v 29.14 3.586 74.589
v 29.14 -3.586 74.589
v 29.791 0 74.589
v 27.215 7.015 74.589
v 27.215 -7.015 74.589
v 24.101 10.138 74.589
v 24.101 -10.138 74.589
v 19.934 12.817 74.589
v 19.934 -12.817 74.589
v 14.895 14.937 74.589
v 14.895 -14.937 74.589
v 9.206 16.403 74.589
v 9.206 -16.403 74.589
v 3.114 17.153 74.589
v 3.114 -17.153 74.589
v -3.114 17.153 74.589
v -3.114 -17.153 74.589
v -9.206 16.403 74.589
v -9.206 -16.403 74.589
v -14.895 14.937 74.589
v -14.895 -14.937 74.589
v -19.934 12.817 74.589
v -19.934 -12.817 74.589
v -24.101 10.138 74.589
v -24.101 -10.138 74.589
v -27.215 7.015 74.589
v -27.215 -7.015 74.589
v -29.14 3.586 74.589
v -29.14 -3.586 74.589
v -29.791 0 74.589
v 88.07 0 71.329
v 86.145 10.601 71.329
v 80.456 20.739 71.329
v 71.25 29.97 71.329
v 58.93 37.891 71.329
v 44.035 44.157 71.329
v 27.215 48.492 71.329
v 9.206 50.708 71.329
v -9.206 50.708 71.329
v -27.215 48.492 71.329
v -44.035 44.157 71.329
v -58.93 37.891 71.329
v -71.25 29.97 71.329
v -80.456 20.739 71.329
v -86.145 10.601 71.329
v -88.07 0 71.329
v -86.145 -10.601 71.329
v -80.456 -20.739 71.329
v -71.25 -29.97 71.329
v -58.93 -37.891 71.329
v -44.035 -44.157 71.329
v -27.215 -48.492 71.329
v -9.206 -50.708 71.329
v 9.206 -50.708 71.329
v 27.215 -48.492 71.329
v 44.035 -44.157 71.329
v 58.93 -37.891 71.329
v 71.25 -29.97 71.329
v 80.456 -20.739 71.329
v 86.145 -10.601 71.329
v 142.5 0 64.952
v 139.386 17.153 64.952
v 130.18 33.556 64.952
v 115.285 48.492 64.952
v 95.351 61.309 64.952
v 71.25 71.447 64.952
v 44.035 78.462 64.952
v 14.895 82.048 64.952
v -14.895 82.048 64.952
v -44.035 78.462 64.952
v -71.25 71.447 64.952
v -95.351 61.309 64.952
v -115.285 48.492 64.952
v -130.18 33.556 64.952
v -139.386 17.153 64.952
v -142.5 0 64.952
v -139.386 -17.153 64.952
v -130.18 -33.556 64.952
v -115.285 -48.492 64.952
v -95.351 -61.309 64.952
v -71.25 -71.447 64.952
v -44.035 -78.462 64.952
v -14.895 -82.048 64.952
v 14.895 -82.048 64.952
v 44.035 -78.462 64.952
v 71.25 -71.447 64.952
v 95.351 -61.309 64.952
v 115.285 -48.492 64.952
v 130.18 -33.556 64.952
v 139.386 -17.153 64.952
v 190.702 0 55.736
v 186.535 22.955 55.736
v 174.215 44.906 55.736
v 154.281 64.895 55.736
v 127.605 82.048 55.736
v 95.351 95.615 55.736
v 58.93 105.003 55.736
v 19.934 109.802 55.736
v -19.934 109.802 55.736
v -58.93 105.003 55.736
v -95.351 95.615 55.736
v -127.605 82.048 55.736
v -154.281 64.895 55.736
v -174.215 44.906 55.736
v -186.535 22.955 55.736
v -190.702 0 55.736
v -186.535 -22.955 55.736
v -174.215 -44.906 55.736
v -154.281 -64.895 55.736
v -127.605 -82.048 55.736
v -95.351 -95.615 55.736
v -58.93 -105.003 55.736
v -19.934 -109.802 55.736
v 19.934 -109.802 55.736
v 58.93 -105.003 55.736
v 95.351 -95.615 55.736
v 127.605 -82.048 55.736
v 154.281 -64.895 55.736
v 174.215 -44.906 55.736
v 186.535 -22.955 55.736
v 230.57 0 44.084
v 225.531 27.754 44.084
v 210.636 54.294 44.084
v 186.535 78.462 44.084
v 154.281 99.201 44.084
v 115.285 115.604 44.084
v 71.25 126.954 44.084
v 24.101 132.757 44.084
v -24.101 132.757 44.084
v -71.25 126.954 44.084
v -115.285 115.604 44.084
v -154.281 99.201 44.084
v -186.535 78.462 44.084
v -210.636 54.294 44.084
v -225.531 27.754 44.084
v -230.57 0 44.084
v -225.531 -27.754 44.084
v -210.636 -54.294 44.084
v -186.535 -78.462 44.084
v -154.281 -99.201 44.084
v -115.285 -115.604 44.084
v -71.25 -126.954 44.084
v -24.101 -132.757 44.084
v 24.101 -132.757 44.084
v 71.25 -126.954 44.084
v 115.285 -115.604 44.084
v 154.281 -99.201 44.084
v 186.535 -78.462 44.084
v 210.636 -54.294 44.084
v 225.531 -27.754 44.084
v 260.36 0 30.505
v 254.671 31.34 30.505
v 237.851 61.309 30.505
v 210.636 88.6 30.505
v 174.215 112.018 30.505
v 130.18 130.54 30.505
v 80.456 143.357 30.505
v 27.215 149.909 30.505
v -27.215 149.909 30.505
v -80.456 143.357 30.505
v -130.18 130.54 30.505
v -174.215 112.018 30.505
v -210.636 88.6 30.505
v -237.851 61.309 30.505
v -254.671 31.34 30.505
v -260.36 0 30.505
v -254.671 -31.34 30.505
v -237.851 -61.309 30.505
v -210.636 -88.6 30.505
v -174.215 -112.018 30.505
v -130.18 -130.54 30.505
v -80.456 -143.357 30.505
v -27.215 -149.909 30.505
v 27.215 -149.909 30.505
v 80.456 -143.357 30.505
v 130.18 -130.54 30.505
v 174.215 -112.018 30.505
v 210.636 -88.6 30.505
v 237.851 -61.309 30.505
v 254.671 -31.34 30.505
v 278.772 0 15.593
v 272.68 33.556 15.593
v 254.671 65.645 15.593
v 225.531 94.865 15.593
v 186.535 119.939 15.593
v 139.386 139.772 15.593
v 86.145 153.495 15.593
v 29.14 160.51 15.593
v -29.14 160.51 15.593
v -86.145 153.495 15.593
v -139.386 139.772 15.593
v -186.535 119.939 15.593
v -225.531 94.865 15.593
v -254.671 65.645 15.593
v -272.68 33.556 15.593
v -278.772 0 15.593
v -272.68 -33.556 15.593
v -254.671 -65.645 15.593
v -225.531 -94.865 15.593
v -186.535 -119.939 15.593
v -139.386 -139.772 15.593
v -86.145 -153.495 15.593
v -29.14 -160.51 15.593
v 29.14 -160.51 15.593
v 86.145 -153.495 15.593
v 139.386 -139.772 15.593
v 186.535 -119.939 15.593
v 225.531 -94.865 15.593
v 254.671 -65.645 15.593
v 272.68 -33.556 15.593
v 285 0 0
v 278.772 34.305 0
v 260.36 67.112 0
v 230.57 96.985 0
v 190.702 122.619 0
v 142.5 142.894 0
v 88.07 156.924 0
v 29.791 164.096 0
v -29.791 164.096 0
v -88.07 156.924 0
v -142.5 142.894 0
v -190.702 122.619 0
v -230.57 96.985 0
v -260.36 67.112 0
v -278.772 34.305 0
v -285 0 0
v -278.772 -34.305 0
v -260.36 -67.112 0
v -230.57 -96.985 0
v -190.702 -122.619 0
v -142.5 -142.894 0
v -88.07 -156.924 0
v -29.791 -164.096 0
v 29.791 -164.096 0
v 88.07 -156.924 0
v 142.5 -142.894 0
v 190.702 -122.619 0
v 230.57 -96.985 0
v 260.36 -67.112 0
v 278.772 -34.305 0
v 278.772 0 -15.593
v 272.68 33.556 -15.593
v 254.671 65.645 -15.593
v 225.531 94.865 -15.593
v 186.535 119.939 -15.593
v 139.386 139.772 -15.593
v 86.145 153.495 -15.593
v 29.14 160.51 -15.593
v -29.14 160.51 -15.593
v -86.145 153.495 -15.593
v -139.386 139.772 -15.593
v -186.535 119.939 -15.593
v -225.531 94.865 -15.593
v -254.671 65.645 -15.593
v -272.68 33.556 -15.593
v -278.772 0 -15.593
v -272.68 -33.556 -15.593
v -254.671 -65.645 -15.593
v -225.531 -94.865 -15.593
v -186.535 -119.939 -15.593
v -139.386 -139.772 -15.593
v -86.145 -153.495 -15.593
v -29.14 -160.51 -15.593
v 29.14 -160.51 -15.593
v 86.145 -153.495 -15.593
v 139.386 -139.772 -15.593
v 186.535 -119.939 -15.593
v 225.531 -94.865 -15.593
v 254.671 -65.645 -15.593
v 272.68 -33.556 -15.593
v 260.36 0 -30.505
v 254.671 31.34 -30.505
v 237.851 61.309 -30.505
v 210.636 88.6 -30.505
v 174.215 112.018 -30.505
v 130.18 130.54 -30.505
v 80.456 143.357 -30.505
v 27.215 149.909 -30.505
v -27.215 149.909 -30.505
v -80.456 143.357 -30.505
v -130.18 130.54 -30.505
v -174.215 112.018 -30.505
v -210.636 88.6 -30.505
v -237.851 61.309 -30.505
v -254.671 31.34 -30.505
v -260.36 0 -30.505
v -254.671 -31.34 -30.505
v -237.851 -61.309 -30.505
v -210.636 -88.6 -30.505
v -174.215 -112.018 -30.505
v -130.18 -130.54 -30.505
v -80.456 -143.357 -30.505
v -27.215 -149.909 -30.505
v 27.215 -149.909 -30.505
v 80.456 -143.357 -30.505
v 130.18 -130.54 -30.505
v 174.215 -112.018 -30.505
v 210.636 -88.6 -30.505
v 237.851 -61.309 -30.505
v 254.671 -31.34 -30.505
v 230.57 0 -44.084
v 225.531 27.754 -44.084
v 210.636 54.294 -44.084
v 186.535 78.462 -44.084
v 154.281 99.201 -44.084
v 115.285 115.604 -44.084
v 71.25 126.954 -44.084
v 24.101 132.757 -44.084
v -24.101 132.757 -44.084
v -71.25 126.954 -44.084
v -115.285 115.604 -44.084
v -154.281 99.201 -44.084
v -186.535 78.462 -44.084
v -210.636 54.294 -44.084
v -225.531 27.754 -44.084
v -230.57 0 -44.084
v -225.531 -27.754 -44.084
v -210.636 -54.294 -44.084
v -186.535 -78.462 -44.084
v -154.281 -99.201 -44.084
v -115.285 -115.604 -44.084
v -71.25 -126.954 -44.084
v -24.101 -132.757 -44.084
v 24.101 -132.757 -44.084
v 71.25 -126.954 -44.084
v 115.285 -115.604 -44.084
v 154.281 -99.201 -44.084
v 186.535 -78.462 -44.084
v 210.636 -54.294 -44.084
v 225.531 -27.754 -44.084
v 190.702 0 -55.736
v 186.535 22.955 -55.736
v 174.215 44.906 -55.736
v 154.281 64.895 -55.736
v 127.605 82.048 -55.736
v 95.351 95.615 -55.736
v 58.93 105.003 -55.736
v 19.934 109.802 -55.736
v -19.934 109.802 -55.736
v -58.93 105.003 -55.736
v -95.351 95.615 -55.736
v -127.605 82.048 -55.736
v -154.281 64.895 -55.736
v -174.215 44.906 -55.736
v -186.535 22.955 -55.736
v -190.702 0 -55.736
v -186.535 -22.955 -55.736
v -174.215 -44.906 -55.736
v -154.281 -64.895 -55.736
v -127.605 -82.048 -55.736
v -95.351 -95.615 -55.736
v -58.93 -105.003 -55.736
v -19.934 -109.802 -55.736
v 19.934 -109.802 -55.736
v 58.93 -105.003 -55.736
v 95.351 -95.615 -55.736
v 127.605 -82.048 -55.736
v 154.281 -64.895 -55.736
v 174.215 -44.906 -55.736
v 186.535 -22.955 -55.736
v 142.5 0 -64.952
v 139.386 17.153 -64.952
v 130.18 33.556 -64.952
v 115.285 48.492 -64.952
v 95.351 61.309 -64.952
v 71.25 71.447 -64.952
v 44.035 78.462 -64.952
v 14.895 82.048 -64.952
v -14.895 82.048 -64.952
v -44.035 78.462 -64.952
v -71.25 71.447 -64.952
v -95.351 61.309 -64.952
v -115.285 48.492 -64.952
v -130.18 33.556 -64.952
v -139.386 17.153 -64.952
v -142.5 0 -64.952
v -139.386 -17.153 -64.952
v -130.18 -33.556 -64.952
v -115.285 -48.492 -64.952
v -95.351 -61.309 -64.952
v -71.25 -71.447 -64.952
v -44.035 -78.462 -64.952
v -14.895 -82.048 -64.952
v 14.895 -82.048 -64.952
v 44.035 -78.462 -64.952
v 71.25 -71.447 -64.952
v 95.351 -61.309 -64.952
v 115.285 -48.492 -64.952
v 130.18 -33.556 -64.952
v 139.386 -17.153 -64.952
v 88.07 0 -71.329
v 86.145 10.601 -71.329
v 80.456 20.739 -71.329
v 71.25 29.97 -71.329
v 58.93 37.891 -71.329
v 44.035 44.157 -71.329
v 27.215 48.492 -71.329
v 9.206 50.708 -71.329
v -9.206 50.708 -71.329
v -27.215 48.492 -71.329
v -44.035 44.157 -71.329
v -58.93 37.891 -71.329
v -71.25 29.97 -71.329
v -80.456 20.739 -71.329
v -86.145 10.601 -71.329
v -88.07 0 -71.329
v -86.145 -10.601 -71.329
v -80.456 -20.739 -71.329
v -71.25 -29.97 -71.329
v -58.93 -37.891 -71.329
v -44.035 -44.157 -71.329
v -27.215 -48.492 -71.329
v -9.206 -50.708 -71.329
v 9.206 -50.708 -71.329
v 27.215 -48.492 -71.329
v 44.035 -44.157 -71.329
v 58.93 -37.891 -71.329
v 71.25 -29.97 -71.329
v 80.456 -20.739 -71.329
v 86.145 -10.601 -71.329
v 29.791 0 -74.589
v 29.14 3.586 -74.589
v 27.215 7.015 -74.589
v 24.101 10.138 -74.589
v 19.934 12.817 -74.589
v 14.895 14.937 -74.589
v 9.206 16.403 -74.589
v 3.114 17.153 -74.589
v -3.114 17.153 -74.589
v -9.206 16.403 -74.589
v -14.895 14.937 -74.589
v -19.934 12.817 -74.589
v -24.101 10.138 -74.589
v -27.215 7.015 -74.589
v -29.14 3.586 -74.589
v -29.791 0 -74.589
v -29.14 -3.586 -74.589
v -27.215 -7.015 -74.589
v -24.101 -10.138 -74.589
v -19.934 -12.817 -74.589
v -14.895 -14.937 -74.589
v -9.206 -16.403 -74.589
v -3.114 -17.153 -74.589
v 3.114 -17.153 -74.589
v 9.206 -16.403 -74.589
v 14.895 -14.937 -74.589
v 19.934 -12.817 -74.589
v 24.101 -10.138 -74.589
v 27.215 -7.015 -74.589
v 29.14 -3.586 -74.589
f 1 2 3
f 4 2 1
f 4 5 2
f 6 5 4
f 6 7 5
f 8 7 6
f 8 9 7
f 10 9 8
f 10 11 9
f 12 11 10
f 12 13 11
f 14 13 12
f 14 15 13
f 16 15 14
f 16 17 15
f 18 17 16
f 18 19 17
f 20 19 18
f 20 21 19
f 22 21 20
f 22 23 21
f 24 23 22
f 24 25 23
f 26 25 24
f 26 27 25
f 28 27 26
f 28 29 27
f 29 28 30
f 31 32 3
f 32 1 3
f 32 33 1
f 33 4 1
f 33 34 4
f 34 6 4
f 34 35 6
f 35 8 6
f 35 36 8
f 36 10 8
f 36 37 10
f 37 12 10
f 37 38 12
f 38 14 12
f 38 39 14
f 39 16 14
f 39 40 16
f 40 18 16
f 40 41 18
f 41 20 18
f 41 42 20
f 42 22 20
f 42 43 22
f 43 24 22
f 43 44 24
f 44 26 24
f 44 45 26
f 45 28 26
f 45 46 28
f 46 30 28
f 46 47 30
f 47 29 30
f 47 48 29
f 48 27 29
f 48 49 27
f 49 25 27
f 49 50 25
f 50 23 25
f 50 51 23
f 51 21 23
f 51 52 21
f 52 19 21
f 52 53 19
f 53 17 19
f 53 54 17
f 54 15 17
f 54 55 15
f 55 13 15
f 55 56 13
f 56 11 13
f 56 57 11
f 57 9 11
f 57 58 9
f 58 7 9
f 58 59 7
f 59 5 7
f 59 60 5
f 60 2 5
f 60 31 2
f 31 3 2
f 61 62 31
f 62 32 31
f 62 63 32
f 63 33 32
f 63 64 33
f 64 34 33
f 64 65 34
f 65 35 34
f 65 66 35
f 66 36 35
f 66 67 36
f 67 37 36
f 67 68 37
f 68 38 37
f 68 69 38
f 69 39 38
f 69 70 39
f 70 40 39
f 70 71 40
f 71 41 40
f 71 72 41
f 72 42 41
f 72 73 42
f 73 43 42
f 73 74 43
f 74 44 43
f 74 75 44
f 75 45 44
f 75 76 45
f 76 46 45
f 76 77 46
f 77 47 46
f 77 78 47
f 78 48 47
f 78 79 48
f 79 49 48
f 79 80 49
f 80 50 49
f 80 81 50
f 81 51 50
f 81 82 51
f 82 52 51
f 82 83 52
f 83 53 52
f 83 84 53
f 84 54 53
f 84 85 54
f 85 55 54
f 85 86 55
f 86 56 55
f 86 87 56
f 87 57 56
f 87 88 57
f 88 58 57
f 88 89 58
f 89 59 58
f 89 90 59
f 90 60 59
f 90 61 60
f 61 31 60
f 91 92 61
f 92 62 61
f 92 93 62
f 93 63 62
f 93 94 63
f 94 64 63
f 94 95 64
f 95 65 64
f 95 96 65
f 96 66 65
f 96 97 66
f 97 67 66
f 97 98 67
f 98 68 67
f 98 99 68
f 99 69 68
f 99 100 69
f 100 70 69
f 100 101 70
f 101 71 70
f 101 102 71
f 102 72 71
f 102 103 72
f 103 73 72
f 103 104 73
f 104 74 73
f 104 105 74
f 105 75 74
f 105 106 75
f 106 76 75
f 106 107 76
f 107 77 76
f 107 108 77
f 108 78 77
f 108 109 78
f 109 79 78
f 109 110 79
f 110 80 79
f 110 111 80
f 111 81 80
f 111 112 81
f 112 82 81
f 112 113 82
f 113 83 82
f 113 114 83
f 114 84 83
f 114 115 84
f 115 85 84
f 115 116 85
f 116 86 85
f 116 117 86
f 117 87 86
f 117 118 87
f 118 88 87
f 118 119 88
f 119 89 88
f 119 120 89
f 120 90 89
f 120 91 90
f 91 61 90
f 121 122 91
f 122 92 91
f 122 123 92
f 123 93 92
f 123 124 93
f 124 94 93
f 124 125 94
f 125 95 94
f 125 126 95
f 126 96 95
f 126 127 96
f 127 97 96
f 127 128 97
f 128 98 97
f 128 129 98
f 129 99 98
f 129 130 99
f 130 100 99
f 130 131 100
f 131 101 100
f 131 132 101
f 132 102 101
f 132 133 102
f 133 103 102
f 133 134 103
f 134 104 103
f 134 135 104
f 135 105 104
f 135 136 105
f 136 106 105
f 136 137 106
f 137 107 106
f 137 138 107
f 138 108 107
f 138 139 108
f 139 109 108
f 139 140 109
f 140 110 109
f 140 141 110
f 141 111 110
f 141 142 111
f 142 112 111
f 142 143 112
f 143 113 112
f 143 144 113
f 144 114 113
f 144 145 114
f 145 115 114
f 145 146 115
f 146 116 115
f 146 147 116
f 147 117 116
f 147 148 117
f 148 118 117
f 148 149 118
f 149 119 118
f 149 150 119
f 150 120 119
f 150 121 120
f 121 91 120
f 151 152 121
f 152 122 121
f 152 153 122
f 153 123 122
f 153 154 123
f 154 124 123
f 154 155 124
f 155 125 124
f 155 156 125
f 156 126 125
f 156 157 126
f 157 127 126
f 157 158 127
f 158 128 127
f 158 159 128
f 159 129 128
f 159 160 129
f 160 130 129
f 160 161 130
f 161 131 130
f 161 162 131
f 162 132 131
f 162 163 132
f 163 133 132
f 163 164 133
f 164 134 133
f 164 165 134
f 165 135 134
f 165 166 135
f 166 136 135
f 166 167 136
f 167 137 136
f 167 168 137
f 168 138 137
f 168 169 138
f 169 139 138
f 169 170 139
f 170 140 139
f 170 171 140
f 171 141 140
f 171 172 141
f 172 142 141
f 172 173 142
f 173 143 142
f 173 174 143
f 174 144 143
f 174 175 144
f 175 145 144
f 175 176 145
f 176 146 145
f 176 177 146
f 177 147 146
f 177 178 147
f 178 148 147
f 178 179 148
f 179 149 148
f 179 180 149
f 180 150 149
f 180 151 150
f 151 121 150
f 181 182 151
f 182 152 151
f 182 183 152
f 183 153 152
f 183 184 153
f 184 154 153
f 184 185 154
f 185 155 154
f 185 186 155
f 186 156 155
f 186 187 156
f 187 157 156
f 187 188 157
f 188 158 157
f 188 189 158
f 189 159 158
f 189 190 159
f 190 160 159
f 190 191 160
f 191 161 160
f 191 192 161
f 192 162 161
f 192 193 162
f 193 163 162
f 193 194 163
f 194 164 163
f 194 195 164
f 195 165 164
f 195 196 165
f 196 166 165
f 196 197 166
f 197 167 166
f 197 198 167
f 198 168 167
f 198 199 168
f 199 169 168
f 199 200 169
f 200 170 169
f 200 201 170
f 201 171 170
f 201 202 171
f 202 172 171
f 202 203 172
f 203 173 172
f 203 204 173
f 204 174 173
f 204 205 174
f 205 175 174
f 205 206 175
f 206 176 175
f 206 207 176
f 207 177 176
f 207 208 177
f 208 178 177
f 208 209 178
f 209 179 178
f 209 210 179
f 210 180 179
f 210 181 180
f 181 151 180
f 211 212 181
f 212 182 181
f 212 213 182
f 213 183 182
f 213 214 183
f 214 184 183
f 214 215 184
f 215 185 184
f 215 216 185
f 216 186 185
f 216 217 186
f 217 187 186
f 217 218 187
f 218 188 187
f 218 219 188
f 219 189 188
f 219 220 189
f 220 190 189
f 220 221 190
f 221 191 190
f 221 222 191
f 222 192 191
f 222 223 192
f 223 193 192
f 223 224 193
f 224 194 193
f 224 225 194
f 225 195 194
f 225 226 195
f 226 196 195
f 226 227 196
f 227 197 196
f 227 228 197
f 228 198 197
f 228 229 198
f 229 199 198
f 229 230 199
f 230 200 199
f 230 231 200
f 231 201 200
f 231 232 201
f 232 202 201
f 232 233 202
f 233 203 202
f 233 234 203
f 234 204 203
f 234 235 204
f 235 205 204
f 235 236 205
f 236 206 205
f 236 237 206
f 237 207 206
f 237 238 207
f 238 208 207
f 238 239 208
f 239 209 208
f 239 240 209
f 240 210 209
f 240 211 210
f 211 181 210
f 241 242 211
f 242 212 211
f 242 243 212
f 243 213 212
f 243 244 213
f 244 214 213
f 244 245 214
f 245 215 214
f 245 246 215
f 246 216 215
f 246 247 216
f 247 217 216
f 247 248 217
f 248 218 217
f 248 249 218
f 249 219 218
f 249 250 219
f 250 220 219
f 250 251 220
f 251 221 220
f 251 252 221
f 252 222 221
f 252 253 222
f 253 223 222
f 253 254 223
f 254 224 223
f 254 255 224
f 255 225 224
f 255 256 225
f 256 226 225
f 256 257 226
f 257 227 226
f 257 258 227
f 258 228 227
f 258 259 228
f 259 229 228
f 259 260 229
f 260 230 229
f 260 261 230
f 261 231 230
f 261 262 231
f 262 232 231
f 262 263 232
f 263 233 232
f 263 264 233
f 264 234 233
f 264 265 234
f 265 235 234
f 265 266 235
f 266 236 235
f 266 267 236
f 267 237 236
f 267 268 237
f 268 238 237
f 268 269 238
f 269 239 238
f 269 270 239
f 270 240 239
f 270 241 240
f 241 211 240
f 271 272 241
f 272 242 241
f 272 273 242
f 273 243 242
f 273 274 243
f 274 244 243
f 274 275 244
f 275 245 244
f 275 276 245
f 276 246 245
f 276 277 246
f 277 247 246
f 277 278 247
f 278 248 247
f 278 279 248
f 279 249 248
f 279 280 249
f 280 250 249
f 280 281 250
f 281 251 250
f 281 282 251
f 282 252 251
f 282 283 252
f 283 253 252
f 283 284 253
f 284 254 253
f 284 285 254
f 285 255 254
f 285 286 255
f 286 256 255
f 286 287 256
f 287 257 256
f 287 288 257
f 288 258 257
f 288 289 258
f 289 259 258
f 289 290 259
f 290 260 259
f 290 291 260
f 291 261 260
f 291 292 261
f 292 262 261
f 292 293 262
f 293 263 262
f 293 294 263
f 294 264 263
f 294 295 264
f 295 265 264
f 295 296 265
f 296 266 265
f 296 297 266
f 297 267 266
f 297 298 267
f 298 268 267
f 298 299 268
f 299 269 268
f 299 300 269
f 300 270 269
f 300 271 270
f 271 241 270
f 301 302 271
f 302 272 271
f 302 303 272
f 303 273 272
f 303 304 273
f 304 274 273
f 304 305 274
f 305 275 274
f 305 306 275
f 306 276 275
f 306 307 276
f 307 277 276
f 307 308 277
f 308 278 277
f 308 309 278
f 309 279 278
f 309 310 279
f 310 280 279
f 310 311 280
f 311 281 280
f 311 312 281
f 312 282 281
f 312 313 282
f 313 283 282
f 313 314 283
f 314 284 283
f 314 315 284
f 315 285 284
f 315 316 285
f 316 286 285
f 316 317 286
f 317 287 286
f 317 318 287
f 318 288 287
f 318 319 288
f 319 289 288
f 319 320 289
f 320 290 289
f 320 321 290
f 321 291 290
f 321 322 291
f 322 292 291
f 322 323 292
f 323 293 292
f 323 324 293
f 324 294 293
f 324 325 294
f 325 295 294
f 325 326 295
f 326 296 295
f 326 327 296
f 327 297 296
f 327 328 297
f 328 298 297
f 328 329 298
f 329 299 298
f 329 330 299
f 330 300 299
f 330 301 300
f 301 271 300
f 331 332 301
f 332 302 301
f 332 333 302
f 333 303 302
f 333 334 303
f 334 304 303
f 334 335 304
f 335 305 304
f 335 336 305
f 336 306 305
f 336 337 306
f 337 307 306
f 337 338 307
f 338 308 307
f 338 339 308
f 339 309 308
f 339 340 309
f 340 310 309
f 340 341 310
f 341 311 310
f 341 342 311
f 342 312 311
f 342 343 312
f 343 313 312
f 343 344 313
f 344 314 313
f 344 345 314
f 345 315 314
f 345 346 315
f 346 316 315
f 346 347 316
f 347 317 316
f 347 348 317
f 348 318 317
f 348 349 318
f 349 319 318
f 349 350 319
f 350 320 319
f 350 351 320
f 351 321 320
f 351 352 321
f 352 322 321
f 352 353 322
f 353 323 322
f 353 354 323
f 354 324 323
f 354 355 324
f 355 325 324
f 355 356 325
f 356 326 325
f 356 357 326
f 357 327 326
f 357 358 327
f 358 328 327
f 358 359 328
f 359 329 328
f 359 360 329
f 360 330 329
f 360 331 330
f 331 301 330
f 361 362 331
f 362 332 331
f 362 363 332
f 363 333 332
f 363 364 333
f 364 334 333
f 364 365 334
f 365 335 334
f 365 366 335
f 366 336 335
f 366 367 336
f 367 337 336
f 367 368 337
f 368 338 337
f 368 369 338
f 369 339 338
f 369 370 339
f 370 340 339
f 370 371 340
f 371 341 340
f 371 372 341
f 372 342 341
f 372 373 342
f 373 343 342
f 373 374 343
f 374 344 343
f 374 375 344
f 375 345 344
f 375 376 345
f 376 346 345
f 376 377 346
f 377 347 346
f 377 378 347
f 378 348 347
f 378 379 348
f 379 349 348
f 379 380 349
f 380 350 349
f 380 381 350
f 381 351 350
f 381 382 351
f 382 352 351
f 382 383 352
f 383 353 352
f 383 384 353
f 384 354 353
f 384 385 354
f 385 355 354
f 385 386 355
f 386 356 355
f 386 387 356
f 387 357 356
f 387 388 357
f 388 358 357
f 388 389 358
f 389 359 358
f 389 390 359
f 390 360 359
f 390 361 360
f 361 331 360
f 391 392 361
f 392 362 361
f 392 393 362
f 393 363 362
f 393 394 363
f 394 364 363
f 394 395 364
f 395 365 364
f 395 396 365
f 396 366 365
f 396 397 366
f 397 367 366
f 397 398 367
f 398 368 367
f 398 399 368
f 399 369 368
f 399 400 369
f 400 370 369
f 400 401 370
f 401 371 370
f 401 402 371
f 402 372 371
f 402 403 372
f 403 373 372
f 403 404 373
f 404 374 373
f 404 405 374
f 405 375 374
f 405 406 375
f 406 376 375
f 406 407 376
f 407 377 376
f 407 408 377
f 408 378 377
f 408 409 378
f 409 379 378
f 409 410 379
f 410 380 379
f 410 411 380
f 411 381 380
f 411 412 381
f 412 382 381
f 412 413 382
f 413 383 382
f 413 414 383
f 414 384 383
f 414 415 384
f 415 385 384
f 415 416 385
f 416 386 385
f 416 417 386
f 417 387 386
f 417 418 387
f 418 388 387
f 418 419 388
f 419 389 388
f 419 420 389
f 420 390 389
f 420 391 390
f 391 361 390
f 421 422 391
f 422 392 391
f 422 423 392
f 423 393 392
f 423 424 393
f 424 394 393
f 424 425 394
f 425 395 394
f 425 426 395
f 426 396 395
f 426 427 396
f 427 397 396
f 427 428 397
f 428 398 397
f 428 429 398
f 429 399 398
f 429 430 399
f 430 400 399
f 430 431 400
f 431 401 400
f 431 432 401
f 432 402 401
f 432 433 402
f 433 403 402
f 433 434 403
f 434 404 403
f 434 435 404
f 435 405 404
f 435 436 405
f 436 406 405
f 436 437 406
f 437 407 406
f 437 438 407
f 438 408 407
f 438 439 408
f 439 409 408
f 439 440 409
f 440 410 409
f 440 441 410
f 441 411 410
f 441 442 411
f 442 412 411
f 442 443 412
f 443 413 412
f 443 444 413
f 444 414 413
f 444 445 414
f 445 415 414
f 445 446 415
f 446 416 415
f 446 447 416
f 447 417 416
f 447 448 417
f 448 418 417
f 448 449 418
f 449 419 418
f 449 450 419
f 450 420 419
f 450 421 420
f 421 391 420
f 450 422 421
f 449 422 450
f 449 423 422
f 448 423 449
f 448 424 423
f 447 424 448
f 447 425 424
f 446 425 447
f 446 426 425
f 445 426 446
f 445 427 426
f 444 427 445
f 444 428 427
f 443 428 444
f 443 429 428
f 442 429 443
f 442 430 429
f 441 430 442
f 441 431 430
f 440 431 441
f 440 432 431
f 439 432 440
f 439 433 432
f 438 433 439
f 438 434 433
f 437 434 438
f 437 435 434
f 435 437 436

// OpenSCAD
// Generated by SolidPython 1.0.1 on 2020-07-29 00:46:54


scale(v = [19, 11, 5]) {
	sphere(r = 15);
}
/***********************************************
*********      SolidPython code:      **********
************************************************
 
# import packages: SolidPython
from solid import *
from solid.utils import *
from itertools import chain, combinations, permutations


class Resize:

    def __init__(self, scad_file):
        self.scad_file = scad_file
        #self.scad_file = import_scad(scad_file)
        # cone/cylinder param:
        self.r1 = 0
        self.r2 = 0
        self.h = 0
        # rectangular prism param:
        self.w = 0
        self.l = 0
        # ellipse param:
        self.r = 0

    # import OpenScad code (file name corresponds to shape)


    # classify shape + parameters
    def assign(self, param1, param2, param3):
        if self.scad_file == 'cone.scad':
            self.r1 = param1
            self.r2 = param2
            self.h = param3
        elif self.scad_file == 'cylinder.scad':
            self.r1 = param1
            self.r2 = param2
            self.h = param3
        elif self.scad_file == 'rectangularPrism.scad':
            self.h = param1
            self.l = param2
            self.w = param3
        else:
            self.r = param1
            self.h = param2

    # resize parameters
    def iterate(self):
        x = range(3, 20, 2)
        i = 1
        if self.scad_file == 'cone.scad':
            tempList = list(permutations(x, 2))
            for temp in tempList:
                param1 = temp[0]
                param2 = temp[1]
                filepath = 'produced_scad_files/' + 'cone' + str(param1) + '_' + str(param2) + '_' + '.scad'
                scad_render_to_file(cylinder(h=param1, r1=param2, r2=0), filepath)

        elif self.scad_file == 'cylinder.scad':
            tempList = list(permutations(x, 3))
            for temp in tempList:
                param1 = temp[0]
                param2 = temp[1]
                filepath = 'produced_scad_files/' + 'cylinder' + str(param1) + '_' + str(param2) + '_' + '.scad'
                scad_render_to_file(cylinder(h=param1, r1=param2, r2=param2), filepath)

        elif self.scad_file == 'rectangularPrism.scad':
            tempList = list(permutations(x, 3))
            for temp in tempList:
                param1 = temp[0]
                param2 = temp[1]
                param3 = temp[2]
                filepath = 'produced_scad_files/' + 'rectangularPrism' + str(param1) + '_' + str(param2) + '_' + str(
                    param3) + '.scad'
                scad_render_to_file(cube(size=(param1, param2, param3)), filepath)

        elif self.scad_file == 'ellipse.scad':
            tempList = list(permutations(x, 4))
            for temp in tempList:
                param1 = temp[0]
                param2 = temp[1]
                param3 = temp[2]
                param4 = temp[3]
                filepath = 'produced_scad_files/' + 'ellipse' + str(param1) + '_' + str(param2) + '_' + str(param3) + '_' + str(param4) + '.scad'
                scad_render_to_file(scale([param1, param2, param3])(sphere(r=param4)), filepath)

    def render_to_scadfile(self):
        scad_render_to_file(scad, 'example.scad') 
 
************************************************/
